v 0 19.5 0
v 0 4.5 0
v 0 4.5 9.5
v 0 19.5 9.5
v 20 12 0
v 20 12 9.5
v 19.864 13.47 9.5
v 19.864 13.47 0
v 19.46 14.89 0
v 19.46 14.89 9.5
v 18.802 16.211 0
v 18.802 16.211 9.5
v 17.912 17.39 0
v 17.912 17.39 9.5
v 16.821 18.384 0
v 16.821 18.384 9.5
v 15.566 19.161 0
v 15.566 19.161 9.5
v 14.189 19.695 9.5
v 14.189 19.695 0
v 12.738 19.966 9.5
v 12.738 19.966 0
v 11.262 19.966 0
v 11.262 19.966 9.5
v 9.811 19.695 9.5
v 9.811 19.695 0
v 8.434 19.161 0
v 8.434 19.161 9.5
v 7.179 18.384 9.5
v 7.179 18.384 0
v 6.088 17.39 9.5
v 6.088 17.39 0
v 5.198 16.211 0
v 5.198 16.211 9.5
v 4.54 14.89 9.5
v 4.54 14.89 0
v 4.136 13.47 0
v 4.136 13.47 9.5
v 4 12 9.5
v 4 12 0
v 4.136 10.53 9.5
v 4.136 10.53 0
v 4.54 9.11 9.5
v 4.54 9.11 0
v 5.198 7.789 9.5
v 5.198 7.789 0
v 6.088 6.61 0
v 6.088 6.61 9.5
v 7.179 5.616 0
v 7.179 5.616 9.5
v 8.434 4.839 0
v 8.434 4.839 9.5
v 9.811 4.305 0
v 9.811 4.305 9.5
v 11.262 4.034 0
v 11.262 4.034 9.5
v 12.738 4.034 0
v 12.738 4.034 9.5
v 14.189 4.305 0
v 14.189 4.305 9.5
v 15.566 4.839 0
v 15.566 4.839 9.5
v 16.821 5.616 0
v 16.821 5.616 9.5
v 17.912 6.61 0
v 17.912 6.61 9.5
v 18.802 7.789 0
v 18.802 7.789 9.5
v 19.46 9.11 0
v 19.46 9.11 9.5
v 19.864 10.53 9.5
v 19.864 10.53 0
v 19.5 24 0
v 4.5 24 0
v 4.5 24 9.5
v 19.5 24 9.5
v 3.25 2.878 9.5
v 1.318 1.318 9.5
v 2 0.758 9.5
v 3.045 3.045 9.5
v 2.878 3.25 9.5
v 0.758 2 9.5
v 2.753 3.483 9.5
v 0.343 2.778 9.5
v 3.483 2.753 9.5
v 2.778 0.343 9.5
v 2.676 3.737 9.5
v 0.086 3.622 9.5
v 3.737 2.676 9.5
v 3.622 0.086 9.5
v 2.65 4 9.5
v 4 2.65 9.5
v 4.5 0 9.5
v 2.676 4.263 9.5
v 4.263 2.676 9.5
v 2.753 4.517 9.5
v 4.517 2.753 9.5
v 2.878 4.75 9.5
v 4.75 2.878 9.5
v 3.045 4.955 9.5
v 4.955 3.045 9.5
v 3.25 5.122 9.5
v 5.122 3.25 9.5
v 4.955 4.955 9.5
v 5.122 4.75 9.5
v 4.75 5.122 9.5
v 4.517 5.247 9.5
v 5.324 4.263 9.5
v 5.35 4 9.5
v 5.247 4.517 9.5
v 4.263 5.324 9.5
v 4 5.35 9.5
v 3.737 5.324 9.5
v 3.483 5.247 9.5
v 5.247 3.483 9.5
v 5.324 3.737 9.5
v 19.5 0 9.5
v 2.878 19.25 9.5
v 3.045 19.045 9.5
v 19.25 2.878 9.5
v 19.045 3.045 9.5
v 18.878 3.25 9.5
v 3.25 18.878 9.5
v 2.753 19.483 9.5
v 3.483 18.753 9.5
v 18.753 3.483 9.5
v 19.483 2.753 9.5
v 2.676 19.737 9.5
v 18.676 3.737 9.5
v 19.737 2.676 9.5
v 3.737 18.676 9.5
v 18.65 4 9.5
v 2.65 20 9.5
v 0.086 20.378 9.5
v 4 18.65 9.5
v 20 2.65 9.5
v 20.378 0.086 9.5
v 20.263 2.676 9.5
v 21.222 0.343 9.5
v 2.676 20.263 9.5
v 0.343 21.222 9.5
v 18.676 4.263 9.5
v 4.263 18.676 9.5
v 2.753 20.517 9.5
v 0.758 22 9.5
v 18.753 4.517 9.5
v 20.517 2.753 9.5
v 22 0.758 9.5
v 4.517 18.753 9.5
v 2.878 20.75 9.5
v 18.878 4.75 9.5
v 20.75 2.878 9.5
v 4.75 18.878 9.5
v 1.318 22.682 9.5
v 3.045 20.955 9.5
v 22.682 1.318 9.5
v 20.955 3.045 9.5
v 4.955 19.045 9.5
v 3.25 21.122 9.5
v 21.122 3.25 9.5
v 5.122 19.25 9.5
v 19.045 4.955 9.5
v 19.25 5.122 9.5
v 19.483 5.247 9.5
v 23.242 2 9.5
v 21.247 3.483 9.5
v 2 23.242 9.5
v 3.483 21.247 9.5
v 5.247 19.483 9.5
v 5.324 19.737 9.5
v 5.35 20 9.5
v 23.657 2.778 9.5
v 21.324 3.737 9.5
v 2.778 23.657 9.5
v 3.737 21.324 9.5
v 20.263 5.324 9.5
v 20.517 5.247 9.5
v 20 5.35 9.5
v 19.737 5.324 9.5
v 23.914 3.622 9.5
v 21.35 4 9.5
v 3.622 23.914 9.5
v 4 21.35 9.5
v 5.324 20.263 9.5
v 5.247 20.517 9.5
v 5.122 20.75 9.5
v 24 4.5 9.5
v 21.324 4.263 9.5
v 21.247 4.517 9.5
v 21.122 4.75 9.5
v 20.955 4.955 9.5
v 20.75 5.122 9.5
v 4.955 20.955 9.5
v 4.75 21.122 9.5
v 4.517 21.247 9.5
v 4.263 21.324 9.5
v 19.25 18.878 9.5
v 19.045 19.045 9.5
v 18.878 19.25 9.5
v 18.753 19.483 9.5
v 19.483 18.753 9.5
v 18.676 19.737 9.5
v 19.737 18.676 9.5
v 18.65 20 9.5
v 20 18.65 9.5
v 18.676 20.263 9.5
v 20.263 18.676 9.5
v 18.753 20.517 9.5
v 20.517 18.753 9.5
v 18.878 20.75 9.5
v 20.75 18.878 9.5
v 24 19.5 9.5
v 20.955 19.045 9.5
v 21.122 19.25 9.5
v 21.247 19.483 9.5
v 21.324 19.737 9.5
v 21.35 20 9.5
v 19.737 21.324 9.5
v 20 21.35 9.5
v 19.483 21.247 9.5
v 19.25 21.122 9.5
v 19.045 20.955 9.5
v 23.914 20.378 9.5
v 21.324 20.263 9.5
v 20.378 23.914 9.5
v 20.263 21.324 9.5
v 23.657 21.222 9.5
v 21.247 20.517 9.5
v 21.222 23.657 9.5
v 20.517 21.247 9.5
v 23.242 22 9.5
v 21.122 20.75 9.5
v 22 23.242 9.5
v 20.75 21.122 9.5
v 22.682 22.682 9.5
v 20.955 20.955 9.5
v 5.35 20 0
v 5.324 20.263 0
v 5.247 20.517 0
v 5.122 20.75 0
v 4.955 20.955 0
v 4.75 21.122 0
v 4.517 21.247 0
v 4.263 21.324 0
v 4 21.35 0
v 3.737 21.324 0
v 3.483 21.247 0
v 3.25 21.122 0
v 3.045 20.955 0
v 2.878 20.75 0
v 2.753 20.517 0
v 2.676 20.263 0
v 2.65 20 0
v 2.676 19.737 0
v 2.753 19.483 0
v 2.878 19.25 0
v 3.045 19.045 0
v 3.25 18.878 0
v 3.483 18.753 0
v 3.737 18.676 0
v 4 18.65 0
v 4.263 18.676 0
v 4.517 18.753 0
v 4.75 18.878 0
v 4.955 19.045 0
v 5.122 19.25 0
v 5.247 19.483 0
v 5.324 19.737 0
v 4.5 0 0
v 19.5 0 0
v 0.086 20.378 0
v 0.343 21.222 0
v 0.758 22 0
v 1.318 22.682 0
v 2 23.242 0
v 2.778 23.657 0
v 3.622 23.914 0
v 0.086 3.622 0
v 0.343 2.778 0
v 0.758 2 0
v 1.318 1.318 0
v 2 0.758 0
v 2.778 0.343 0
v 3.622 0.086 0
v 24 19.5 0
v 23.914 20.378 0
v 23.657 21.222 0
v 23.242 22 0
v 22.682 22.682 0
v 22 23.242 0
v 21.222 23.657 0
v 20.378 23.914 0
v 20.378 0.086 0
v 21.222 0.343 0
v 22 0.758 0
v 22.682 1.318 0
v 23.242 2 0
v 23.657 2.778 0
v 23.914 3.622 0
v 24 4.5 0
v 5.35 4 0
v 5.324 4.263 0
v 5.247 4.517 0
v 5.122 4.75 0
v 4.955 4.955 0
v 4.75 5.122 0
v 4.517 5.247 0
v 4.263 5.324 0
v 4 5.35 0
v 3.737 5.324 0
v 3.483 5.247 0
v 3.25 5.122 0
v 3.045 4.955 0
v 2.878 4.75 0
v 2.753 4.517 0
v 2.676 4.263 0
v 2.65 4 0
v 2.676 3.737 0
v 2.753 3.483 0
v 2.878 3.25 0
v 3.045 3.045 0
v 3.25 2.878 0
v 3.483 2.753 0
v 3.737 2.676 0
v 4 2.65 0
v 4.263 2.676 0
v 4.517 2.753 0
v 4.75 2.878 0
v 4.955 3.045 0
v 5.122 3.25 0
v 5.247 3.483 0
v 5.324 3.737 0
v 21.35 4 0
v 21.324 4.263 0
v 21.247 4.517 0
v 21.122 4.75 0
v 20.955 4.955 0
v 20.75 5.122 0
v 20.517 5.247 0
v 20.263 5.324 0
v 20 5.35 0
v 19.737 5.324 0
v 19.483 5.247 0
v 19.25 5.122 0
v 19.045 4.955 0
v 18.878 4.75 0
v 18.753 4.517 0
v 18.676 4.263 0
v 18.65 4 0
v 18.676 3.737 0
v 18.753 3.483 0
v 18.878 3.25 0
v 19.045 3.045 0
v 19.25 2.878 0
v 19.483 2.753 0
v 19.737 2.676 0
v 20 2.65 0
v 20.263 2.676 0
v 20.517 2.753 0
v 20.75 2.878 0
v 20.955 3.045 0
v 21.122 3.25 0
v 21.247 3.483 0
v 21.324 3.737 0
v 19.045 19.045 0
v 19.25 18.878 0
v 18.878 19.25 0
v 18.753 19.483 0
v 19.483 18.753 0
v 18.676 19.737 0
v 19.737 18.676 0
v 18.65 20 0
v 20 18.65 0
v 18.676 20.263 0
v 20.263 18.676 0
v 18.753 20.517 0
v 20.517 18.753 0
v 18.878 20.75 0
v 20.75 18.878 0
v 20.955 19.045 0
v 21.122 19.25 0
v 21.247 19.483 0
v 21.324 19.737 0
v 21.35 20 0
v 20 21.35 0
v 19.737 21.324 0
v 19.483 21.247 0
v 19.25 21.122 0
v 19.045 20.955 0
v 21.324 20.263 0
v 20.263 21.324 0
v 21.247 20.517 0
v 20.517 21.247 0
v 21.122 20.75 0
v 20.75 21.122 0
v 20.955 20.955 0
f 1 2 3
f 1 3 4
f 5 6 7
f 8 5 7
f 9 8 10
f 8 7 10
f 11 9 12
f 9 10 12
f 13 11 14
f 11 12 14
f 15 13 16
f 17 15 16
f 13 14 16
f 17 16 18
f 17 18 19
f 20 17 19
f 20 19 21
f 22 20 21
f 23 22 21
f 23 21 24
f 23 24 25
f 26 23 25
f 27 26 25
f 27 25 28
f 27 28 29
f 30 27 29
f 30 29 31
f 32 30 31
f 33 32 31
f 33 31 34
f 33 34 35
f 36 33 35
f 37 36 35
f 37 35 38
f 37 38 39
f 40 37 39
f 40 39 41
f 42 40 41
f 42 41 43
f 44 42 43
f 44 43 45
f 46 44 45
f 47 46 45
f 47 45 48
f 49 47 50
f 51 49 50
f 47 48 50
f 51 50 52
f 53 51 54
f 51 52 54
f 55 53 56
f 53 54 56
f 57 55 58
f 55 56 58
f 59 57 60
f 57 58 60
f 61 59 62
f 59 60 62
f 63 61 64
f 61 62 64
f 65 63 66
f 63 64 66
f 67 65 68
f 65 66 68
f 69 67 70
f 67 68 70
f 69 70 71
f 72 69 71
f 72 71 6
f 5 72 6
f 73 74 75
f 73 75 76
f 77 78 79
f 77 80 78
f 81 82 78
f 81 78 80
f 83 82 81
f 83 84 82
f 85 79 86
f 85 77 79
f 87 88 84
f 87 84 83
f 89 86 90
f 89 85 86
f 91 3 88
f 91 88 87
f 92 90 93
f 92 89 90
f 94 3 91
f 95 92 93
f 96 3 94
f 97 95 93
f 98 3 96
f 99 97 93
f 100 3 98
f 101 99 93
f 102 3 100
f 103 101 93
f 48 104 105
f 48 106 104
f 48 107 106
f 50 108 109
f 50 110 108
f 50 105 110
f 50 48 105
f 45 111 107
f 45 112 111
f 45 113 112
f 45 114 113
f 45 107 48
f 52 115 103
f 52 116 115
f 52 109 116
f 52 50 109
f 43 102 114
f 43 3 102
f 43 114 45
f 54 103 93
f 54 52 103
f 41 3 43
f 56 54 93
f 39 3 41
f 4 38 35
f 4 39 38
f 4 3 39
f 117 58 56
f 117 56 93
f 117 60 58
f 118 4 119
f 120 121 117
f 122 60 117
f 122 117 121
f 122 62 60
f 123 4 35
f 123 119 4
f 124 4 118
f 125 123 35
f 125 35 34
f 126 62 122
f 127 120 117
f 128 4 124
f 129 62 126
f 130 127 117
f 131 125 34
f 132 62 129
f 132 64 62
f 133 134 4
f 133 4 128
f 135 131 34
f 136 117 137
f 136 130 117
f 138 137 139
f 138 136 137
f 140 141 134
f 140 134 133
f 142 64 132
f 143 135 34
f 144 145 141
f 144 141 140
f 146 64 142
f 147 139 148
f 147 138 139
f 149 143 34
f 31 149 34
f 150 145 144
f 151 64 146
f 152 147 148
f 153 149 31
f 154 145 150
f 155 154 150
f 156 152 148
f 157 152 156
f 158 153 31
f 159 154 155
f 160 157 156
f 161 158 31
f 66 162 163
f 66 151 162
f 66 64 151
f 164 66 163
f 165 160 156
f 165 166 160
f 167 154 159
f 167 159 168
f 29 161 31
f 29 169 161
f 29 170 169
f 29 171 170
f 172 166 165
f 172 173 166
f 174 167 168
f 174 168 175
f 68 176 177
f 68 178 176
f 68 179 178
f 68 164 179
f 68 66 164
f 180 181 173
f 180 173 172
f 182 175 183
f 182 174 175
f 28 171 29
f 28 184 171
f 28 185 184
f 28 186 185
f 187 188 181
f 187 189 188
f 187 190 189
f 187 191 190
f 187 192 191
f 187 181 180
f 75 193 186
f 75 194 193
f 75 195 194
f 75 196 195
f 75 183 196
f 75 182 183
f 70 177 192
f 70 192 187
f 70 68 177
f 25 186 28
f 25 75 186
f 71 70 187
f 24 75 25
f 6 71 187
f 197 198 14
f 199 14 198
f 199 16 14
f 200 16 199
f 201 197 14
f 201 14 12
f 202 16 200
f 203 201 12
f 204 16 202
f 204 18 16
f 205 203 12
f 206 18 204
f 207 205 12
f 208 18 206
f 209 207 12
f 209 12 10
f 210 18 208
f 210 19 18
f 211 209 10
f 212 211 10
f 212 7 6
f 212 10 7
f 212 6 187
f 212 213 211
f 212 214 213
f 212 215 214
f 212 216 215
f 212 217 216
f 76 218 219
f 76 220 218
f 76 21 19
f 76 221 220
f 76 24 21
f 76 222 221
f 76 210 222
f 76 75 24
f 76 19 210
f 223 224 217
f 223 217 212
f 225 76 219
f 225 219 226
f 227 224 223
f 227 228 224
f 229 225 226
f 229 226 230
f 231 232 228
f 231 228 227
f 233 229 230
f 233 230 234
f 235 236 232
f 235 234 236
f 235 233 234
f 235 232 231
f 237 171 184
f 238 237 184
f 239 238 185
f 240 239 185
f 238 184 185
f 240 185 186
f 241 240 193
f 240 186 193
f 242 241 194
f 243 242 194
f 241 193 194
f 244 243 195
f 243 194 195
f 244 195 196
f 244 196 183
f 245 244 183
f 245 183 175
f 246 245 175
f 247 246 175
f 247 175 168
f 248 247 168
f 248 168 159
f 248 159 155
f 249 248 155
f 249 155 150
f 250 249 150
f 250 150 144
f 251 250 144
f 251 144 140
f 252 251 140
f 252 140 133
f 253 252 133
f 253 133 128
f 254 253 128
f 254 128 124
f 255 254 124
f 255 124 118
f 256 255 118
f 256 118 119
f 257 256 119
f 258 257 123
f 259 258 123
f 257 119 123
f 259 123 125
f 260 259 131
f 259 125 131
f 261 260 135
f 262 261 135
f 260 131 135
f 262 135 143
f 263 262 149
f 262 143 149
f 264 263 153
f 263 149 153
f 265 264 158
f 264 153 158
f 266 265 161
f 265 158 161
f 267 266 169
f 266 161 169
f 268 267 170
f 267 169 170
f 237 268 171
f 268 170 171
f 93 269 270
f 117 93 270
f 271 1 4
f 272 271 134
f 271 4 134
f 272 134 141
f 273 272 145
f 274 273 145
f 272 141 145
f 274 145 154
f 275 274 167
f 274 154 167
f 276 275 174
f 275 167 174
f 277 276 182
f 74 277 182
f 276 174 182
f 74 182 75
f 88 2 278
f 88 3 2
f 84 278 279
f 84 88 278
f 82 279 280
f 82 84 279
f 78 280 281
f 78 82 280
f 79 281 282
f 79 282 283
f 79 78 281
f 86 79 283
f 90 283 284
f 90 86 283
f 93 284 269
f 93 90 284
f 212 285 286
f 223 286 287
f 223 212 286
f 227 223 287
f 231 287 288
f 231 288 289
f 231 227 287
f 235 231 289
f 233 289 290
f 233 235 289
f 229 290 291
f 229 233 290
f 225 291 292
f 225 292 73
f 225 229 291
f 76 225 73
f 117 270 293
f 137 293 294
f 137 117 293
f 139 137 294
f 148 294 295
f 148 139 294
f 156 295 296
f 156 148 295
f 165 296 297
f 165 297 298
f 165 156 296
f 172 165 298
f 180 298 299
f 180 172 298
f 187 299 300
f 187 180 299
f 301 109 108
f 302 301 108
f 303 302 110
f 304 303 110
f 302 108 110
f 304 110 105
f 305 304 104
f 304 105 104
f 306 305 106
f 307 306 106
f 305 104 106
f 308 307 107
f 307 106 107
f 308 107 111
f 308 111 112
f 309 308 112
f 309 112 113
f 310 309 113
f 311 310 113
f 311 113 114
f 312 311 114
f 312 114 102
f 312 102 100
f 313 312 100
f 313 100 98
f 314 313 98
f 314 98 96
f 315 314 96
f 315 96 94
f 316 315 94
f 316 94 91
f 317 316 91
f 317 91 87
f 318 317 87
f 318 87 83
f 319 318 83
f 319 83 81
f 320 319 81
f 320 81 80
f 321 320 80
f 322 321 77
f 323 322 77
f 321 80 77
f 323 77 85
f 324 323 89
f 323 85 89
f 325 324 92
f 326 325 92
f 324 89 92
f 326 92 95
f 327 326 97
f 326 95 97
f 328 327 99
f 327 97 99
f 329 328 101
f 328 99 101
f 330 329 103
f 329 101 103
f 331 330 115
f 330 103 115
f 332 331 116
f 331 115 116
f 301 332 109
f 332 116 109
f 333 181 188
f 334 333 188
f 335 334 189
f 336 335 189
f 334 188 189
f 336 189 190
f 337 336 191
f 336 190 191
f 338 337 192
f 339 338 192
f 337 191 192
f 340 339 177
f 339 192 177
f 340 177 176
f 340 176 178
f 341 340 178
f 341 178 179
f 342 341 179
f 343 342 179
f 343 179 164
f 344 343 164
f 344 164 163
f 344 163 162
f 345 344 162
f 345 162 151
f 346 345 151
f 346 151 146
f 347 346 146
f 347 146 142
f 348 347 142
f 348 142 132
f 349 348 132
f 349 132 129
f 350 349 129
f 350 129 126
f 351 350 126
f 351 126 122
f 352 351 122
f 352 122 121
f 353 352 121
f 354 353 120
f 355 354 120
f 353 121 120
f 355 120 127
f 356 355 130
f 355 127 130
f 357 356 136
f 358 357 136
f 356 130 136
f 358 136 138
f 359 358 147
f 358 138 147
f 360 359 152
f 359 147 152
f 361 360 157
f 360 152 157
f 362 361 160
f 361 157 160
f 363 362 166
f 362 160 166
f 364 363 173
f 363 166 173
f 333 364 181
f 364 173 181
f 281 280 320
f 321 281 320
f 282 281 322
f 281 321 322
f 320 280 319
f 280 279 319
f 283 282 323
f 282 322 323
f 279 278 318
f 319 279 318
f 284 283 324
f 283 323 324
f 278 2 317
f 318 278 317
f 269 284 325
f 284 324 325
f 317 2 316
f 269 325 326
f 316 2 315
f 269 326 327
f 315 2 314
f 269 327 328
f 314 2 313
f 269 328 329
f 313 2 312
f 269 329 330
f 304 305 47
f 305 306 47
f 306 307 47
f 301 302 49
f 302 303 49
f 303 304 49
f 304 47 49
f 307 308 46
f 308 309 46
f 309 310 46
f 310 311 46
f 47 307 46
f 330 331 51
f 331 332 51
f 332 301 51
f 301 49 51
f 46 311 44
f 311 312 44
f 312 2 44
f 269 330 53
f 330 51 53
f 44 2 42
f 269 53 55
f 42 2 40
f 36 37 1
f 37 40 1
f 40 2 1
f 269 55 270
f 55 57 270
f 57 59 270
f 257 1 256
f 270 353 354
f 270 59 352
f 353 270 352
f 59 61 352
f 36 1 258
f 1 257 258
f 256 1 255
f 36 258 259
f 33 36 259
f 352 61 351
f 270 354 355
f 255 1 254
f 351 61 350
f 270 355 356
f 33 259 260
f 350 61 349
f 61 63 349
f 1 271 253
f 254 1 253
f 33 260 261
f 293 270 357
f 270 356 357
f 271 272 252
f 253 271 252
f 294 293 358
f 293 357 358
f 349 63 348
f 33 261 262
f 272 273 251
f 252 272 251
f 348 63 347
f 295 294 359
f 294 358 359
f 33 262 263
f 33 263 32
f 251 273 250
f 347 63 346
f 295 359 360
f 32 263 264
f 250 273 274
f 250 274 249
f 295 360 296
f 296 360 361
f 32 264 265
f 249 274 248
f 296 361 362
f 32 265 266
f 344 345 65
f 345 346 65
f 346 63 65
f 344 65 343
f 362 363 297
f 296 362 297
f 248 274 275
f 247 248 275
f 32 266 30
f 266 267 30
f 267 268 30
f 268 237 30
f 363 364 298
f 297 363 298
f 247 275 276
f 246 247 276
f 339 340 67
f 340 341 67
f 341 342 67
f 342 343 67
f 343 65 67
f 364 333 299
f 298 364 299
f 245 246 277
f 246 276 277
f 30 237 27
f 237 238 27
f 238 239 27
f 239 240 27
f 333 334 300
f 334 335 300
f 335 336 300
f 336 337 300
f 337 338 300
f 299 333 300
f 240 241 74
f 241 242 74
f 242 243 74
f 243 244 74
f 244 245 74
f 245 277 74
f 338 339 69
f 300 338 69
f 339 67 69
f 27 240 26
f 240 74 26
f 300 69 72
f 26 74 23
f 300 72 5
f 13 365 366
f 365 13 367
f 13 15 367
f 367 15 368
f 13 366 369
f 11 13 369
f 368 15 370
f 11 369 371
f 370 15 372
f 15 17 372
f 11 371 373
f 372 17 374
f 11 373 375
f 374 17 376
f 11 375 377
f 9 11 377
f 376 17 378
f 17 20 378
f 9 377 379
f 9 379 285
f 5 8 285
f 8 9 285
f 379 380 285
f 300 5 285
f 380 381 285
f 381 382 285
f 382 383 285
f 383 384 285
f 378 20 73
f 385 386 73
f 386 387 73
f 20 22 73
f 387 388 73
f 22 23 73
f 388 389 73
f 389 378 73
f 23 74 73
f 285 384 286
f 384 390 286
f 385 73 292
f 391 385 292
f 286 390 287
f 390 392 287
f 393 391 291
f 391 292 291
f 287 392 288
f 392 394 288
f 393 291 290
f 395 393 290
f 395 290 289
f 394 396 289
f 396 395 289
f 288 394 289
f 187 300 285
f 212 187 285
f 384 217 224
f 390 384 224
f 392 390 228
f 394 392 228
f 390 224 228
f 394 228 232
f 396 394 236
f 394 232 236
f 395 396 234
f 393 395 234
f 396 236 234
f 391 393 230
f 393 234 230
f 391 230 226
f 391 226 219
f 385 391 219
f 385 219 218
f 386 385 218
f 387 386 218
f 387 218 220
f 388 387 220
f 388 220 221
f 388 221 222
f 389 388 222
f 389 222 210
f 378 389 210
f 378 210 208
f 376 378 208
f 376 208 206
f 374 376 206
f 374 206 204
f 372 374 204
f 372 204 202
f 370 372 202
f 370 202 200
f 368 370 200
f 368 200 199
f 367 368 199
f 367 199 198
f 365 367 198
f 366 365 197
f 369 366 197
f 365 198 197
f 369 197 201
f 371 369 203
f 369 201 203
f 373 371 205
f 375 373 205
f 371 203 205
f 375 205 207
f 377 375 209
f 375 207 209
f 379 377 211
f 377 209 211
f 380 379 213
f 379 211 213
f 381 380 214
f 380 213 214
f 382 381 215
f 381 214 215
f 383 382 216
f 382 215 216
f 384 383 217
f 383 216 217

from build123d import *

# Parameters (mm, degrees)
F0_W     = 24
F0_H     = 24
F1_DEPTH = 9.5
F2_R     = 4.5
F4_R     = 8
F5_DEPTH = 9.501
F3_R     = 1.35
F6_DEPTH = 9.501


with BuildPart() as f1:
    # F0 (on Top) → F1 (new body)
    with BuildSketch(Plane.XY):
        with Locations((12, 12)):
            Rectangle(F0_W, F0_H)
    extrude(amount=F1_DEPTH)

    # F2
    f2_edges = [f1.edges().sort_by_distance(p)[0] for p in [
        (0, 0, 4.75),
        (24, 0, 4.75),
        (24, 24, 4.75),
        (0, 24, 4.75),
    ]]
    fillet(f2_edges, radius=F2_R)

    # F4 (on face) → F5 (cut, through all)
    with BuildSketch(Plane.XY.offset(9.5)):
        with Locations((12, 12)):
            Circle(F4_R)
    extrude(amount=-F5_DEPTH, mode=Mode.SUBTRACT)

    # F3 (on face) → F6 (cut, through all)
    with BuildSketch(Plane.XY.offset(9.5)):
        with Locations((4, 4)):
            Circle(F3_R)
        with Locations((4, 20)):
            Circle(F3_R)
        with Locations((20, 4)):
            Circle(F3_R)
        with Locations((20, 20)):
            Circle(F3_R)
    extrude(amount=-F6_DEPTH, mode=Mode.SUBTRACT)


solid = f1.part
